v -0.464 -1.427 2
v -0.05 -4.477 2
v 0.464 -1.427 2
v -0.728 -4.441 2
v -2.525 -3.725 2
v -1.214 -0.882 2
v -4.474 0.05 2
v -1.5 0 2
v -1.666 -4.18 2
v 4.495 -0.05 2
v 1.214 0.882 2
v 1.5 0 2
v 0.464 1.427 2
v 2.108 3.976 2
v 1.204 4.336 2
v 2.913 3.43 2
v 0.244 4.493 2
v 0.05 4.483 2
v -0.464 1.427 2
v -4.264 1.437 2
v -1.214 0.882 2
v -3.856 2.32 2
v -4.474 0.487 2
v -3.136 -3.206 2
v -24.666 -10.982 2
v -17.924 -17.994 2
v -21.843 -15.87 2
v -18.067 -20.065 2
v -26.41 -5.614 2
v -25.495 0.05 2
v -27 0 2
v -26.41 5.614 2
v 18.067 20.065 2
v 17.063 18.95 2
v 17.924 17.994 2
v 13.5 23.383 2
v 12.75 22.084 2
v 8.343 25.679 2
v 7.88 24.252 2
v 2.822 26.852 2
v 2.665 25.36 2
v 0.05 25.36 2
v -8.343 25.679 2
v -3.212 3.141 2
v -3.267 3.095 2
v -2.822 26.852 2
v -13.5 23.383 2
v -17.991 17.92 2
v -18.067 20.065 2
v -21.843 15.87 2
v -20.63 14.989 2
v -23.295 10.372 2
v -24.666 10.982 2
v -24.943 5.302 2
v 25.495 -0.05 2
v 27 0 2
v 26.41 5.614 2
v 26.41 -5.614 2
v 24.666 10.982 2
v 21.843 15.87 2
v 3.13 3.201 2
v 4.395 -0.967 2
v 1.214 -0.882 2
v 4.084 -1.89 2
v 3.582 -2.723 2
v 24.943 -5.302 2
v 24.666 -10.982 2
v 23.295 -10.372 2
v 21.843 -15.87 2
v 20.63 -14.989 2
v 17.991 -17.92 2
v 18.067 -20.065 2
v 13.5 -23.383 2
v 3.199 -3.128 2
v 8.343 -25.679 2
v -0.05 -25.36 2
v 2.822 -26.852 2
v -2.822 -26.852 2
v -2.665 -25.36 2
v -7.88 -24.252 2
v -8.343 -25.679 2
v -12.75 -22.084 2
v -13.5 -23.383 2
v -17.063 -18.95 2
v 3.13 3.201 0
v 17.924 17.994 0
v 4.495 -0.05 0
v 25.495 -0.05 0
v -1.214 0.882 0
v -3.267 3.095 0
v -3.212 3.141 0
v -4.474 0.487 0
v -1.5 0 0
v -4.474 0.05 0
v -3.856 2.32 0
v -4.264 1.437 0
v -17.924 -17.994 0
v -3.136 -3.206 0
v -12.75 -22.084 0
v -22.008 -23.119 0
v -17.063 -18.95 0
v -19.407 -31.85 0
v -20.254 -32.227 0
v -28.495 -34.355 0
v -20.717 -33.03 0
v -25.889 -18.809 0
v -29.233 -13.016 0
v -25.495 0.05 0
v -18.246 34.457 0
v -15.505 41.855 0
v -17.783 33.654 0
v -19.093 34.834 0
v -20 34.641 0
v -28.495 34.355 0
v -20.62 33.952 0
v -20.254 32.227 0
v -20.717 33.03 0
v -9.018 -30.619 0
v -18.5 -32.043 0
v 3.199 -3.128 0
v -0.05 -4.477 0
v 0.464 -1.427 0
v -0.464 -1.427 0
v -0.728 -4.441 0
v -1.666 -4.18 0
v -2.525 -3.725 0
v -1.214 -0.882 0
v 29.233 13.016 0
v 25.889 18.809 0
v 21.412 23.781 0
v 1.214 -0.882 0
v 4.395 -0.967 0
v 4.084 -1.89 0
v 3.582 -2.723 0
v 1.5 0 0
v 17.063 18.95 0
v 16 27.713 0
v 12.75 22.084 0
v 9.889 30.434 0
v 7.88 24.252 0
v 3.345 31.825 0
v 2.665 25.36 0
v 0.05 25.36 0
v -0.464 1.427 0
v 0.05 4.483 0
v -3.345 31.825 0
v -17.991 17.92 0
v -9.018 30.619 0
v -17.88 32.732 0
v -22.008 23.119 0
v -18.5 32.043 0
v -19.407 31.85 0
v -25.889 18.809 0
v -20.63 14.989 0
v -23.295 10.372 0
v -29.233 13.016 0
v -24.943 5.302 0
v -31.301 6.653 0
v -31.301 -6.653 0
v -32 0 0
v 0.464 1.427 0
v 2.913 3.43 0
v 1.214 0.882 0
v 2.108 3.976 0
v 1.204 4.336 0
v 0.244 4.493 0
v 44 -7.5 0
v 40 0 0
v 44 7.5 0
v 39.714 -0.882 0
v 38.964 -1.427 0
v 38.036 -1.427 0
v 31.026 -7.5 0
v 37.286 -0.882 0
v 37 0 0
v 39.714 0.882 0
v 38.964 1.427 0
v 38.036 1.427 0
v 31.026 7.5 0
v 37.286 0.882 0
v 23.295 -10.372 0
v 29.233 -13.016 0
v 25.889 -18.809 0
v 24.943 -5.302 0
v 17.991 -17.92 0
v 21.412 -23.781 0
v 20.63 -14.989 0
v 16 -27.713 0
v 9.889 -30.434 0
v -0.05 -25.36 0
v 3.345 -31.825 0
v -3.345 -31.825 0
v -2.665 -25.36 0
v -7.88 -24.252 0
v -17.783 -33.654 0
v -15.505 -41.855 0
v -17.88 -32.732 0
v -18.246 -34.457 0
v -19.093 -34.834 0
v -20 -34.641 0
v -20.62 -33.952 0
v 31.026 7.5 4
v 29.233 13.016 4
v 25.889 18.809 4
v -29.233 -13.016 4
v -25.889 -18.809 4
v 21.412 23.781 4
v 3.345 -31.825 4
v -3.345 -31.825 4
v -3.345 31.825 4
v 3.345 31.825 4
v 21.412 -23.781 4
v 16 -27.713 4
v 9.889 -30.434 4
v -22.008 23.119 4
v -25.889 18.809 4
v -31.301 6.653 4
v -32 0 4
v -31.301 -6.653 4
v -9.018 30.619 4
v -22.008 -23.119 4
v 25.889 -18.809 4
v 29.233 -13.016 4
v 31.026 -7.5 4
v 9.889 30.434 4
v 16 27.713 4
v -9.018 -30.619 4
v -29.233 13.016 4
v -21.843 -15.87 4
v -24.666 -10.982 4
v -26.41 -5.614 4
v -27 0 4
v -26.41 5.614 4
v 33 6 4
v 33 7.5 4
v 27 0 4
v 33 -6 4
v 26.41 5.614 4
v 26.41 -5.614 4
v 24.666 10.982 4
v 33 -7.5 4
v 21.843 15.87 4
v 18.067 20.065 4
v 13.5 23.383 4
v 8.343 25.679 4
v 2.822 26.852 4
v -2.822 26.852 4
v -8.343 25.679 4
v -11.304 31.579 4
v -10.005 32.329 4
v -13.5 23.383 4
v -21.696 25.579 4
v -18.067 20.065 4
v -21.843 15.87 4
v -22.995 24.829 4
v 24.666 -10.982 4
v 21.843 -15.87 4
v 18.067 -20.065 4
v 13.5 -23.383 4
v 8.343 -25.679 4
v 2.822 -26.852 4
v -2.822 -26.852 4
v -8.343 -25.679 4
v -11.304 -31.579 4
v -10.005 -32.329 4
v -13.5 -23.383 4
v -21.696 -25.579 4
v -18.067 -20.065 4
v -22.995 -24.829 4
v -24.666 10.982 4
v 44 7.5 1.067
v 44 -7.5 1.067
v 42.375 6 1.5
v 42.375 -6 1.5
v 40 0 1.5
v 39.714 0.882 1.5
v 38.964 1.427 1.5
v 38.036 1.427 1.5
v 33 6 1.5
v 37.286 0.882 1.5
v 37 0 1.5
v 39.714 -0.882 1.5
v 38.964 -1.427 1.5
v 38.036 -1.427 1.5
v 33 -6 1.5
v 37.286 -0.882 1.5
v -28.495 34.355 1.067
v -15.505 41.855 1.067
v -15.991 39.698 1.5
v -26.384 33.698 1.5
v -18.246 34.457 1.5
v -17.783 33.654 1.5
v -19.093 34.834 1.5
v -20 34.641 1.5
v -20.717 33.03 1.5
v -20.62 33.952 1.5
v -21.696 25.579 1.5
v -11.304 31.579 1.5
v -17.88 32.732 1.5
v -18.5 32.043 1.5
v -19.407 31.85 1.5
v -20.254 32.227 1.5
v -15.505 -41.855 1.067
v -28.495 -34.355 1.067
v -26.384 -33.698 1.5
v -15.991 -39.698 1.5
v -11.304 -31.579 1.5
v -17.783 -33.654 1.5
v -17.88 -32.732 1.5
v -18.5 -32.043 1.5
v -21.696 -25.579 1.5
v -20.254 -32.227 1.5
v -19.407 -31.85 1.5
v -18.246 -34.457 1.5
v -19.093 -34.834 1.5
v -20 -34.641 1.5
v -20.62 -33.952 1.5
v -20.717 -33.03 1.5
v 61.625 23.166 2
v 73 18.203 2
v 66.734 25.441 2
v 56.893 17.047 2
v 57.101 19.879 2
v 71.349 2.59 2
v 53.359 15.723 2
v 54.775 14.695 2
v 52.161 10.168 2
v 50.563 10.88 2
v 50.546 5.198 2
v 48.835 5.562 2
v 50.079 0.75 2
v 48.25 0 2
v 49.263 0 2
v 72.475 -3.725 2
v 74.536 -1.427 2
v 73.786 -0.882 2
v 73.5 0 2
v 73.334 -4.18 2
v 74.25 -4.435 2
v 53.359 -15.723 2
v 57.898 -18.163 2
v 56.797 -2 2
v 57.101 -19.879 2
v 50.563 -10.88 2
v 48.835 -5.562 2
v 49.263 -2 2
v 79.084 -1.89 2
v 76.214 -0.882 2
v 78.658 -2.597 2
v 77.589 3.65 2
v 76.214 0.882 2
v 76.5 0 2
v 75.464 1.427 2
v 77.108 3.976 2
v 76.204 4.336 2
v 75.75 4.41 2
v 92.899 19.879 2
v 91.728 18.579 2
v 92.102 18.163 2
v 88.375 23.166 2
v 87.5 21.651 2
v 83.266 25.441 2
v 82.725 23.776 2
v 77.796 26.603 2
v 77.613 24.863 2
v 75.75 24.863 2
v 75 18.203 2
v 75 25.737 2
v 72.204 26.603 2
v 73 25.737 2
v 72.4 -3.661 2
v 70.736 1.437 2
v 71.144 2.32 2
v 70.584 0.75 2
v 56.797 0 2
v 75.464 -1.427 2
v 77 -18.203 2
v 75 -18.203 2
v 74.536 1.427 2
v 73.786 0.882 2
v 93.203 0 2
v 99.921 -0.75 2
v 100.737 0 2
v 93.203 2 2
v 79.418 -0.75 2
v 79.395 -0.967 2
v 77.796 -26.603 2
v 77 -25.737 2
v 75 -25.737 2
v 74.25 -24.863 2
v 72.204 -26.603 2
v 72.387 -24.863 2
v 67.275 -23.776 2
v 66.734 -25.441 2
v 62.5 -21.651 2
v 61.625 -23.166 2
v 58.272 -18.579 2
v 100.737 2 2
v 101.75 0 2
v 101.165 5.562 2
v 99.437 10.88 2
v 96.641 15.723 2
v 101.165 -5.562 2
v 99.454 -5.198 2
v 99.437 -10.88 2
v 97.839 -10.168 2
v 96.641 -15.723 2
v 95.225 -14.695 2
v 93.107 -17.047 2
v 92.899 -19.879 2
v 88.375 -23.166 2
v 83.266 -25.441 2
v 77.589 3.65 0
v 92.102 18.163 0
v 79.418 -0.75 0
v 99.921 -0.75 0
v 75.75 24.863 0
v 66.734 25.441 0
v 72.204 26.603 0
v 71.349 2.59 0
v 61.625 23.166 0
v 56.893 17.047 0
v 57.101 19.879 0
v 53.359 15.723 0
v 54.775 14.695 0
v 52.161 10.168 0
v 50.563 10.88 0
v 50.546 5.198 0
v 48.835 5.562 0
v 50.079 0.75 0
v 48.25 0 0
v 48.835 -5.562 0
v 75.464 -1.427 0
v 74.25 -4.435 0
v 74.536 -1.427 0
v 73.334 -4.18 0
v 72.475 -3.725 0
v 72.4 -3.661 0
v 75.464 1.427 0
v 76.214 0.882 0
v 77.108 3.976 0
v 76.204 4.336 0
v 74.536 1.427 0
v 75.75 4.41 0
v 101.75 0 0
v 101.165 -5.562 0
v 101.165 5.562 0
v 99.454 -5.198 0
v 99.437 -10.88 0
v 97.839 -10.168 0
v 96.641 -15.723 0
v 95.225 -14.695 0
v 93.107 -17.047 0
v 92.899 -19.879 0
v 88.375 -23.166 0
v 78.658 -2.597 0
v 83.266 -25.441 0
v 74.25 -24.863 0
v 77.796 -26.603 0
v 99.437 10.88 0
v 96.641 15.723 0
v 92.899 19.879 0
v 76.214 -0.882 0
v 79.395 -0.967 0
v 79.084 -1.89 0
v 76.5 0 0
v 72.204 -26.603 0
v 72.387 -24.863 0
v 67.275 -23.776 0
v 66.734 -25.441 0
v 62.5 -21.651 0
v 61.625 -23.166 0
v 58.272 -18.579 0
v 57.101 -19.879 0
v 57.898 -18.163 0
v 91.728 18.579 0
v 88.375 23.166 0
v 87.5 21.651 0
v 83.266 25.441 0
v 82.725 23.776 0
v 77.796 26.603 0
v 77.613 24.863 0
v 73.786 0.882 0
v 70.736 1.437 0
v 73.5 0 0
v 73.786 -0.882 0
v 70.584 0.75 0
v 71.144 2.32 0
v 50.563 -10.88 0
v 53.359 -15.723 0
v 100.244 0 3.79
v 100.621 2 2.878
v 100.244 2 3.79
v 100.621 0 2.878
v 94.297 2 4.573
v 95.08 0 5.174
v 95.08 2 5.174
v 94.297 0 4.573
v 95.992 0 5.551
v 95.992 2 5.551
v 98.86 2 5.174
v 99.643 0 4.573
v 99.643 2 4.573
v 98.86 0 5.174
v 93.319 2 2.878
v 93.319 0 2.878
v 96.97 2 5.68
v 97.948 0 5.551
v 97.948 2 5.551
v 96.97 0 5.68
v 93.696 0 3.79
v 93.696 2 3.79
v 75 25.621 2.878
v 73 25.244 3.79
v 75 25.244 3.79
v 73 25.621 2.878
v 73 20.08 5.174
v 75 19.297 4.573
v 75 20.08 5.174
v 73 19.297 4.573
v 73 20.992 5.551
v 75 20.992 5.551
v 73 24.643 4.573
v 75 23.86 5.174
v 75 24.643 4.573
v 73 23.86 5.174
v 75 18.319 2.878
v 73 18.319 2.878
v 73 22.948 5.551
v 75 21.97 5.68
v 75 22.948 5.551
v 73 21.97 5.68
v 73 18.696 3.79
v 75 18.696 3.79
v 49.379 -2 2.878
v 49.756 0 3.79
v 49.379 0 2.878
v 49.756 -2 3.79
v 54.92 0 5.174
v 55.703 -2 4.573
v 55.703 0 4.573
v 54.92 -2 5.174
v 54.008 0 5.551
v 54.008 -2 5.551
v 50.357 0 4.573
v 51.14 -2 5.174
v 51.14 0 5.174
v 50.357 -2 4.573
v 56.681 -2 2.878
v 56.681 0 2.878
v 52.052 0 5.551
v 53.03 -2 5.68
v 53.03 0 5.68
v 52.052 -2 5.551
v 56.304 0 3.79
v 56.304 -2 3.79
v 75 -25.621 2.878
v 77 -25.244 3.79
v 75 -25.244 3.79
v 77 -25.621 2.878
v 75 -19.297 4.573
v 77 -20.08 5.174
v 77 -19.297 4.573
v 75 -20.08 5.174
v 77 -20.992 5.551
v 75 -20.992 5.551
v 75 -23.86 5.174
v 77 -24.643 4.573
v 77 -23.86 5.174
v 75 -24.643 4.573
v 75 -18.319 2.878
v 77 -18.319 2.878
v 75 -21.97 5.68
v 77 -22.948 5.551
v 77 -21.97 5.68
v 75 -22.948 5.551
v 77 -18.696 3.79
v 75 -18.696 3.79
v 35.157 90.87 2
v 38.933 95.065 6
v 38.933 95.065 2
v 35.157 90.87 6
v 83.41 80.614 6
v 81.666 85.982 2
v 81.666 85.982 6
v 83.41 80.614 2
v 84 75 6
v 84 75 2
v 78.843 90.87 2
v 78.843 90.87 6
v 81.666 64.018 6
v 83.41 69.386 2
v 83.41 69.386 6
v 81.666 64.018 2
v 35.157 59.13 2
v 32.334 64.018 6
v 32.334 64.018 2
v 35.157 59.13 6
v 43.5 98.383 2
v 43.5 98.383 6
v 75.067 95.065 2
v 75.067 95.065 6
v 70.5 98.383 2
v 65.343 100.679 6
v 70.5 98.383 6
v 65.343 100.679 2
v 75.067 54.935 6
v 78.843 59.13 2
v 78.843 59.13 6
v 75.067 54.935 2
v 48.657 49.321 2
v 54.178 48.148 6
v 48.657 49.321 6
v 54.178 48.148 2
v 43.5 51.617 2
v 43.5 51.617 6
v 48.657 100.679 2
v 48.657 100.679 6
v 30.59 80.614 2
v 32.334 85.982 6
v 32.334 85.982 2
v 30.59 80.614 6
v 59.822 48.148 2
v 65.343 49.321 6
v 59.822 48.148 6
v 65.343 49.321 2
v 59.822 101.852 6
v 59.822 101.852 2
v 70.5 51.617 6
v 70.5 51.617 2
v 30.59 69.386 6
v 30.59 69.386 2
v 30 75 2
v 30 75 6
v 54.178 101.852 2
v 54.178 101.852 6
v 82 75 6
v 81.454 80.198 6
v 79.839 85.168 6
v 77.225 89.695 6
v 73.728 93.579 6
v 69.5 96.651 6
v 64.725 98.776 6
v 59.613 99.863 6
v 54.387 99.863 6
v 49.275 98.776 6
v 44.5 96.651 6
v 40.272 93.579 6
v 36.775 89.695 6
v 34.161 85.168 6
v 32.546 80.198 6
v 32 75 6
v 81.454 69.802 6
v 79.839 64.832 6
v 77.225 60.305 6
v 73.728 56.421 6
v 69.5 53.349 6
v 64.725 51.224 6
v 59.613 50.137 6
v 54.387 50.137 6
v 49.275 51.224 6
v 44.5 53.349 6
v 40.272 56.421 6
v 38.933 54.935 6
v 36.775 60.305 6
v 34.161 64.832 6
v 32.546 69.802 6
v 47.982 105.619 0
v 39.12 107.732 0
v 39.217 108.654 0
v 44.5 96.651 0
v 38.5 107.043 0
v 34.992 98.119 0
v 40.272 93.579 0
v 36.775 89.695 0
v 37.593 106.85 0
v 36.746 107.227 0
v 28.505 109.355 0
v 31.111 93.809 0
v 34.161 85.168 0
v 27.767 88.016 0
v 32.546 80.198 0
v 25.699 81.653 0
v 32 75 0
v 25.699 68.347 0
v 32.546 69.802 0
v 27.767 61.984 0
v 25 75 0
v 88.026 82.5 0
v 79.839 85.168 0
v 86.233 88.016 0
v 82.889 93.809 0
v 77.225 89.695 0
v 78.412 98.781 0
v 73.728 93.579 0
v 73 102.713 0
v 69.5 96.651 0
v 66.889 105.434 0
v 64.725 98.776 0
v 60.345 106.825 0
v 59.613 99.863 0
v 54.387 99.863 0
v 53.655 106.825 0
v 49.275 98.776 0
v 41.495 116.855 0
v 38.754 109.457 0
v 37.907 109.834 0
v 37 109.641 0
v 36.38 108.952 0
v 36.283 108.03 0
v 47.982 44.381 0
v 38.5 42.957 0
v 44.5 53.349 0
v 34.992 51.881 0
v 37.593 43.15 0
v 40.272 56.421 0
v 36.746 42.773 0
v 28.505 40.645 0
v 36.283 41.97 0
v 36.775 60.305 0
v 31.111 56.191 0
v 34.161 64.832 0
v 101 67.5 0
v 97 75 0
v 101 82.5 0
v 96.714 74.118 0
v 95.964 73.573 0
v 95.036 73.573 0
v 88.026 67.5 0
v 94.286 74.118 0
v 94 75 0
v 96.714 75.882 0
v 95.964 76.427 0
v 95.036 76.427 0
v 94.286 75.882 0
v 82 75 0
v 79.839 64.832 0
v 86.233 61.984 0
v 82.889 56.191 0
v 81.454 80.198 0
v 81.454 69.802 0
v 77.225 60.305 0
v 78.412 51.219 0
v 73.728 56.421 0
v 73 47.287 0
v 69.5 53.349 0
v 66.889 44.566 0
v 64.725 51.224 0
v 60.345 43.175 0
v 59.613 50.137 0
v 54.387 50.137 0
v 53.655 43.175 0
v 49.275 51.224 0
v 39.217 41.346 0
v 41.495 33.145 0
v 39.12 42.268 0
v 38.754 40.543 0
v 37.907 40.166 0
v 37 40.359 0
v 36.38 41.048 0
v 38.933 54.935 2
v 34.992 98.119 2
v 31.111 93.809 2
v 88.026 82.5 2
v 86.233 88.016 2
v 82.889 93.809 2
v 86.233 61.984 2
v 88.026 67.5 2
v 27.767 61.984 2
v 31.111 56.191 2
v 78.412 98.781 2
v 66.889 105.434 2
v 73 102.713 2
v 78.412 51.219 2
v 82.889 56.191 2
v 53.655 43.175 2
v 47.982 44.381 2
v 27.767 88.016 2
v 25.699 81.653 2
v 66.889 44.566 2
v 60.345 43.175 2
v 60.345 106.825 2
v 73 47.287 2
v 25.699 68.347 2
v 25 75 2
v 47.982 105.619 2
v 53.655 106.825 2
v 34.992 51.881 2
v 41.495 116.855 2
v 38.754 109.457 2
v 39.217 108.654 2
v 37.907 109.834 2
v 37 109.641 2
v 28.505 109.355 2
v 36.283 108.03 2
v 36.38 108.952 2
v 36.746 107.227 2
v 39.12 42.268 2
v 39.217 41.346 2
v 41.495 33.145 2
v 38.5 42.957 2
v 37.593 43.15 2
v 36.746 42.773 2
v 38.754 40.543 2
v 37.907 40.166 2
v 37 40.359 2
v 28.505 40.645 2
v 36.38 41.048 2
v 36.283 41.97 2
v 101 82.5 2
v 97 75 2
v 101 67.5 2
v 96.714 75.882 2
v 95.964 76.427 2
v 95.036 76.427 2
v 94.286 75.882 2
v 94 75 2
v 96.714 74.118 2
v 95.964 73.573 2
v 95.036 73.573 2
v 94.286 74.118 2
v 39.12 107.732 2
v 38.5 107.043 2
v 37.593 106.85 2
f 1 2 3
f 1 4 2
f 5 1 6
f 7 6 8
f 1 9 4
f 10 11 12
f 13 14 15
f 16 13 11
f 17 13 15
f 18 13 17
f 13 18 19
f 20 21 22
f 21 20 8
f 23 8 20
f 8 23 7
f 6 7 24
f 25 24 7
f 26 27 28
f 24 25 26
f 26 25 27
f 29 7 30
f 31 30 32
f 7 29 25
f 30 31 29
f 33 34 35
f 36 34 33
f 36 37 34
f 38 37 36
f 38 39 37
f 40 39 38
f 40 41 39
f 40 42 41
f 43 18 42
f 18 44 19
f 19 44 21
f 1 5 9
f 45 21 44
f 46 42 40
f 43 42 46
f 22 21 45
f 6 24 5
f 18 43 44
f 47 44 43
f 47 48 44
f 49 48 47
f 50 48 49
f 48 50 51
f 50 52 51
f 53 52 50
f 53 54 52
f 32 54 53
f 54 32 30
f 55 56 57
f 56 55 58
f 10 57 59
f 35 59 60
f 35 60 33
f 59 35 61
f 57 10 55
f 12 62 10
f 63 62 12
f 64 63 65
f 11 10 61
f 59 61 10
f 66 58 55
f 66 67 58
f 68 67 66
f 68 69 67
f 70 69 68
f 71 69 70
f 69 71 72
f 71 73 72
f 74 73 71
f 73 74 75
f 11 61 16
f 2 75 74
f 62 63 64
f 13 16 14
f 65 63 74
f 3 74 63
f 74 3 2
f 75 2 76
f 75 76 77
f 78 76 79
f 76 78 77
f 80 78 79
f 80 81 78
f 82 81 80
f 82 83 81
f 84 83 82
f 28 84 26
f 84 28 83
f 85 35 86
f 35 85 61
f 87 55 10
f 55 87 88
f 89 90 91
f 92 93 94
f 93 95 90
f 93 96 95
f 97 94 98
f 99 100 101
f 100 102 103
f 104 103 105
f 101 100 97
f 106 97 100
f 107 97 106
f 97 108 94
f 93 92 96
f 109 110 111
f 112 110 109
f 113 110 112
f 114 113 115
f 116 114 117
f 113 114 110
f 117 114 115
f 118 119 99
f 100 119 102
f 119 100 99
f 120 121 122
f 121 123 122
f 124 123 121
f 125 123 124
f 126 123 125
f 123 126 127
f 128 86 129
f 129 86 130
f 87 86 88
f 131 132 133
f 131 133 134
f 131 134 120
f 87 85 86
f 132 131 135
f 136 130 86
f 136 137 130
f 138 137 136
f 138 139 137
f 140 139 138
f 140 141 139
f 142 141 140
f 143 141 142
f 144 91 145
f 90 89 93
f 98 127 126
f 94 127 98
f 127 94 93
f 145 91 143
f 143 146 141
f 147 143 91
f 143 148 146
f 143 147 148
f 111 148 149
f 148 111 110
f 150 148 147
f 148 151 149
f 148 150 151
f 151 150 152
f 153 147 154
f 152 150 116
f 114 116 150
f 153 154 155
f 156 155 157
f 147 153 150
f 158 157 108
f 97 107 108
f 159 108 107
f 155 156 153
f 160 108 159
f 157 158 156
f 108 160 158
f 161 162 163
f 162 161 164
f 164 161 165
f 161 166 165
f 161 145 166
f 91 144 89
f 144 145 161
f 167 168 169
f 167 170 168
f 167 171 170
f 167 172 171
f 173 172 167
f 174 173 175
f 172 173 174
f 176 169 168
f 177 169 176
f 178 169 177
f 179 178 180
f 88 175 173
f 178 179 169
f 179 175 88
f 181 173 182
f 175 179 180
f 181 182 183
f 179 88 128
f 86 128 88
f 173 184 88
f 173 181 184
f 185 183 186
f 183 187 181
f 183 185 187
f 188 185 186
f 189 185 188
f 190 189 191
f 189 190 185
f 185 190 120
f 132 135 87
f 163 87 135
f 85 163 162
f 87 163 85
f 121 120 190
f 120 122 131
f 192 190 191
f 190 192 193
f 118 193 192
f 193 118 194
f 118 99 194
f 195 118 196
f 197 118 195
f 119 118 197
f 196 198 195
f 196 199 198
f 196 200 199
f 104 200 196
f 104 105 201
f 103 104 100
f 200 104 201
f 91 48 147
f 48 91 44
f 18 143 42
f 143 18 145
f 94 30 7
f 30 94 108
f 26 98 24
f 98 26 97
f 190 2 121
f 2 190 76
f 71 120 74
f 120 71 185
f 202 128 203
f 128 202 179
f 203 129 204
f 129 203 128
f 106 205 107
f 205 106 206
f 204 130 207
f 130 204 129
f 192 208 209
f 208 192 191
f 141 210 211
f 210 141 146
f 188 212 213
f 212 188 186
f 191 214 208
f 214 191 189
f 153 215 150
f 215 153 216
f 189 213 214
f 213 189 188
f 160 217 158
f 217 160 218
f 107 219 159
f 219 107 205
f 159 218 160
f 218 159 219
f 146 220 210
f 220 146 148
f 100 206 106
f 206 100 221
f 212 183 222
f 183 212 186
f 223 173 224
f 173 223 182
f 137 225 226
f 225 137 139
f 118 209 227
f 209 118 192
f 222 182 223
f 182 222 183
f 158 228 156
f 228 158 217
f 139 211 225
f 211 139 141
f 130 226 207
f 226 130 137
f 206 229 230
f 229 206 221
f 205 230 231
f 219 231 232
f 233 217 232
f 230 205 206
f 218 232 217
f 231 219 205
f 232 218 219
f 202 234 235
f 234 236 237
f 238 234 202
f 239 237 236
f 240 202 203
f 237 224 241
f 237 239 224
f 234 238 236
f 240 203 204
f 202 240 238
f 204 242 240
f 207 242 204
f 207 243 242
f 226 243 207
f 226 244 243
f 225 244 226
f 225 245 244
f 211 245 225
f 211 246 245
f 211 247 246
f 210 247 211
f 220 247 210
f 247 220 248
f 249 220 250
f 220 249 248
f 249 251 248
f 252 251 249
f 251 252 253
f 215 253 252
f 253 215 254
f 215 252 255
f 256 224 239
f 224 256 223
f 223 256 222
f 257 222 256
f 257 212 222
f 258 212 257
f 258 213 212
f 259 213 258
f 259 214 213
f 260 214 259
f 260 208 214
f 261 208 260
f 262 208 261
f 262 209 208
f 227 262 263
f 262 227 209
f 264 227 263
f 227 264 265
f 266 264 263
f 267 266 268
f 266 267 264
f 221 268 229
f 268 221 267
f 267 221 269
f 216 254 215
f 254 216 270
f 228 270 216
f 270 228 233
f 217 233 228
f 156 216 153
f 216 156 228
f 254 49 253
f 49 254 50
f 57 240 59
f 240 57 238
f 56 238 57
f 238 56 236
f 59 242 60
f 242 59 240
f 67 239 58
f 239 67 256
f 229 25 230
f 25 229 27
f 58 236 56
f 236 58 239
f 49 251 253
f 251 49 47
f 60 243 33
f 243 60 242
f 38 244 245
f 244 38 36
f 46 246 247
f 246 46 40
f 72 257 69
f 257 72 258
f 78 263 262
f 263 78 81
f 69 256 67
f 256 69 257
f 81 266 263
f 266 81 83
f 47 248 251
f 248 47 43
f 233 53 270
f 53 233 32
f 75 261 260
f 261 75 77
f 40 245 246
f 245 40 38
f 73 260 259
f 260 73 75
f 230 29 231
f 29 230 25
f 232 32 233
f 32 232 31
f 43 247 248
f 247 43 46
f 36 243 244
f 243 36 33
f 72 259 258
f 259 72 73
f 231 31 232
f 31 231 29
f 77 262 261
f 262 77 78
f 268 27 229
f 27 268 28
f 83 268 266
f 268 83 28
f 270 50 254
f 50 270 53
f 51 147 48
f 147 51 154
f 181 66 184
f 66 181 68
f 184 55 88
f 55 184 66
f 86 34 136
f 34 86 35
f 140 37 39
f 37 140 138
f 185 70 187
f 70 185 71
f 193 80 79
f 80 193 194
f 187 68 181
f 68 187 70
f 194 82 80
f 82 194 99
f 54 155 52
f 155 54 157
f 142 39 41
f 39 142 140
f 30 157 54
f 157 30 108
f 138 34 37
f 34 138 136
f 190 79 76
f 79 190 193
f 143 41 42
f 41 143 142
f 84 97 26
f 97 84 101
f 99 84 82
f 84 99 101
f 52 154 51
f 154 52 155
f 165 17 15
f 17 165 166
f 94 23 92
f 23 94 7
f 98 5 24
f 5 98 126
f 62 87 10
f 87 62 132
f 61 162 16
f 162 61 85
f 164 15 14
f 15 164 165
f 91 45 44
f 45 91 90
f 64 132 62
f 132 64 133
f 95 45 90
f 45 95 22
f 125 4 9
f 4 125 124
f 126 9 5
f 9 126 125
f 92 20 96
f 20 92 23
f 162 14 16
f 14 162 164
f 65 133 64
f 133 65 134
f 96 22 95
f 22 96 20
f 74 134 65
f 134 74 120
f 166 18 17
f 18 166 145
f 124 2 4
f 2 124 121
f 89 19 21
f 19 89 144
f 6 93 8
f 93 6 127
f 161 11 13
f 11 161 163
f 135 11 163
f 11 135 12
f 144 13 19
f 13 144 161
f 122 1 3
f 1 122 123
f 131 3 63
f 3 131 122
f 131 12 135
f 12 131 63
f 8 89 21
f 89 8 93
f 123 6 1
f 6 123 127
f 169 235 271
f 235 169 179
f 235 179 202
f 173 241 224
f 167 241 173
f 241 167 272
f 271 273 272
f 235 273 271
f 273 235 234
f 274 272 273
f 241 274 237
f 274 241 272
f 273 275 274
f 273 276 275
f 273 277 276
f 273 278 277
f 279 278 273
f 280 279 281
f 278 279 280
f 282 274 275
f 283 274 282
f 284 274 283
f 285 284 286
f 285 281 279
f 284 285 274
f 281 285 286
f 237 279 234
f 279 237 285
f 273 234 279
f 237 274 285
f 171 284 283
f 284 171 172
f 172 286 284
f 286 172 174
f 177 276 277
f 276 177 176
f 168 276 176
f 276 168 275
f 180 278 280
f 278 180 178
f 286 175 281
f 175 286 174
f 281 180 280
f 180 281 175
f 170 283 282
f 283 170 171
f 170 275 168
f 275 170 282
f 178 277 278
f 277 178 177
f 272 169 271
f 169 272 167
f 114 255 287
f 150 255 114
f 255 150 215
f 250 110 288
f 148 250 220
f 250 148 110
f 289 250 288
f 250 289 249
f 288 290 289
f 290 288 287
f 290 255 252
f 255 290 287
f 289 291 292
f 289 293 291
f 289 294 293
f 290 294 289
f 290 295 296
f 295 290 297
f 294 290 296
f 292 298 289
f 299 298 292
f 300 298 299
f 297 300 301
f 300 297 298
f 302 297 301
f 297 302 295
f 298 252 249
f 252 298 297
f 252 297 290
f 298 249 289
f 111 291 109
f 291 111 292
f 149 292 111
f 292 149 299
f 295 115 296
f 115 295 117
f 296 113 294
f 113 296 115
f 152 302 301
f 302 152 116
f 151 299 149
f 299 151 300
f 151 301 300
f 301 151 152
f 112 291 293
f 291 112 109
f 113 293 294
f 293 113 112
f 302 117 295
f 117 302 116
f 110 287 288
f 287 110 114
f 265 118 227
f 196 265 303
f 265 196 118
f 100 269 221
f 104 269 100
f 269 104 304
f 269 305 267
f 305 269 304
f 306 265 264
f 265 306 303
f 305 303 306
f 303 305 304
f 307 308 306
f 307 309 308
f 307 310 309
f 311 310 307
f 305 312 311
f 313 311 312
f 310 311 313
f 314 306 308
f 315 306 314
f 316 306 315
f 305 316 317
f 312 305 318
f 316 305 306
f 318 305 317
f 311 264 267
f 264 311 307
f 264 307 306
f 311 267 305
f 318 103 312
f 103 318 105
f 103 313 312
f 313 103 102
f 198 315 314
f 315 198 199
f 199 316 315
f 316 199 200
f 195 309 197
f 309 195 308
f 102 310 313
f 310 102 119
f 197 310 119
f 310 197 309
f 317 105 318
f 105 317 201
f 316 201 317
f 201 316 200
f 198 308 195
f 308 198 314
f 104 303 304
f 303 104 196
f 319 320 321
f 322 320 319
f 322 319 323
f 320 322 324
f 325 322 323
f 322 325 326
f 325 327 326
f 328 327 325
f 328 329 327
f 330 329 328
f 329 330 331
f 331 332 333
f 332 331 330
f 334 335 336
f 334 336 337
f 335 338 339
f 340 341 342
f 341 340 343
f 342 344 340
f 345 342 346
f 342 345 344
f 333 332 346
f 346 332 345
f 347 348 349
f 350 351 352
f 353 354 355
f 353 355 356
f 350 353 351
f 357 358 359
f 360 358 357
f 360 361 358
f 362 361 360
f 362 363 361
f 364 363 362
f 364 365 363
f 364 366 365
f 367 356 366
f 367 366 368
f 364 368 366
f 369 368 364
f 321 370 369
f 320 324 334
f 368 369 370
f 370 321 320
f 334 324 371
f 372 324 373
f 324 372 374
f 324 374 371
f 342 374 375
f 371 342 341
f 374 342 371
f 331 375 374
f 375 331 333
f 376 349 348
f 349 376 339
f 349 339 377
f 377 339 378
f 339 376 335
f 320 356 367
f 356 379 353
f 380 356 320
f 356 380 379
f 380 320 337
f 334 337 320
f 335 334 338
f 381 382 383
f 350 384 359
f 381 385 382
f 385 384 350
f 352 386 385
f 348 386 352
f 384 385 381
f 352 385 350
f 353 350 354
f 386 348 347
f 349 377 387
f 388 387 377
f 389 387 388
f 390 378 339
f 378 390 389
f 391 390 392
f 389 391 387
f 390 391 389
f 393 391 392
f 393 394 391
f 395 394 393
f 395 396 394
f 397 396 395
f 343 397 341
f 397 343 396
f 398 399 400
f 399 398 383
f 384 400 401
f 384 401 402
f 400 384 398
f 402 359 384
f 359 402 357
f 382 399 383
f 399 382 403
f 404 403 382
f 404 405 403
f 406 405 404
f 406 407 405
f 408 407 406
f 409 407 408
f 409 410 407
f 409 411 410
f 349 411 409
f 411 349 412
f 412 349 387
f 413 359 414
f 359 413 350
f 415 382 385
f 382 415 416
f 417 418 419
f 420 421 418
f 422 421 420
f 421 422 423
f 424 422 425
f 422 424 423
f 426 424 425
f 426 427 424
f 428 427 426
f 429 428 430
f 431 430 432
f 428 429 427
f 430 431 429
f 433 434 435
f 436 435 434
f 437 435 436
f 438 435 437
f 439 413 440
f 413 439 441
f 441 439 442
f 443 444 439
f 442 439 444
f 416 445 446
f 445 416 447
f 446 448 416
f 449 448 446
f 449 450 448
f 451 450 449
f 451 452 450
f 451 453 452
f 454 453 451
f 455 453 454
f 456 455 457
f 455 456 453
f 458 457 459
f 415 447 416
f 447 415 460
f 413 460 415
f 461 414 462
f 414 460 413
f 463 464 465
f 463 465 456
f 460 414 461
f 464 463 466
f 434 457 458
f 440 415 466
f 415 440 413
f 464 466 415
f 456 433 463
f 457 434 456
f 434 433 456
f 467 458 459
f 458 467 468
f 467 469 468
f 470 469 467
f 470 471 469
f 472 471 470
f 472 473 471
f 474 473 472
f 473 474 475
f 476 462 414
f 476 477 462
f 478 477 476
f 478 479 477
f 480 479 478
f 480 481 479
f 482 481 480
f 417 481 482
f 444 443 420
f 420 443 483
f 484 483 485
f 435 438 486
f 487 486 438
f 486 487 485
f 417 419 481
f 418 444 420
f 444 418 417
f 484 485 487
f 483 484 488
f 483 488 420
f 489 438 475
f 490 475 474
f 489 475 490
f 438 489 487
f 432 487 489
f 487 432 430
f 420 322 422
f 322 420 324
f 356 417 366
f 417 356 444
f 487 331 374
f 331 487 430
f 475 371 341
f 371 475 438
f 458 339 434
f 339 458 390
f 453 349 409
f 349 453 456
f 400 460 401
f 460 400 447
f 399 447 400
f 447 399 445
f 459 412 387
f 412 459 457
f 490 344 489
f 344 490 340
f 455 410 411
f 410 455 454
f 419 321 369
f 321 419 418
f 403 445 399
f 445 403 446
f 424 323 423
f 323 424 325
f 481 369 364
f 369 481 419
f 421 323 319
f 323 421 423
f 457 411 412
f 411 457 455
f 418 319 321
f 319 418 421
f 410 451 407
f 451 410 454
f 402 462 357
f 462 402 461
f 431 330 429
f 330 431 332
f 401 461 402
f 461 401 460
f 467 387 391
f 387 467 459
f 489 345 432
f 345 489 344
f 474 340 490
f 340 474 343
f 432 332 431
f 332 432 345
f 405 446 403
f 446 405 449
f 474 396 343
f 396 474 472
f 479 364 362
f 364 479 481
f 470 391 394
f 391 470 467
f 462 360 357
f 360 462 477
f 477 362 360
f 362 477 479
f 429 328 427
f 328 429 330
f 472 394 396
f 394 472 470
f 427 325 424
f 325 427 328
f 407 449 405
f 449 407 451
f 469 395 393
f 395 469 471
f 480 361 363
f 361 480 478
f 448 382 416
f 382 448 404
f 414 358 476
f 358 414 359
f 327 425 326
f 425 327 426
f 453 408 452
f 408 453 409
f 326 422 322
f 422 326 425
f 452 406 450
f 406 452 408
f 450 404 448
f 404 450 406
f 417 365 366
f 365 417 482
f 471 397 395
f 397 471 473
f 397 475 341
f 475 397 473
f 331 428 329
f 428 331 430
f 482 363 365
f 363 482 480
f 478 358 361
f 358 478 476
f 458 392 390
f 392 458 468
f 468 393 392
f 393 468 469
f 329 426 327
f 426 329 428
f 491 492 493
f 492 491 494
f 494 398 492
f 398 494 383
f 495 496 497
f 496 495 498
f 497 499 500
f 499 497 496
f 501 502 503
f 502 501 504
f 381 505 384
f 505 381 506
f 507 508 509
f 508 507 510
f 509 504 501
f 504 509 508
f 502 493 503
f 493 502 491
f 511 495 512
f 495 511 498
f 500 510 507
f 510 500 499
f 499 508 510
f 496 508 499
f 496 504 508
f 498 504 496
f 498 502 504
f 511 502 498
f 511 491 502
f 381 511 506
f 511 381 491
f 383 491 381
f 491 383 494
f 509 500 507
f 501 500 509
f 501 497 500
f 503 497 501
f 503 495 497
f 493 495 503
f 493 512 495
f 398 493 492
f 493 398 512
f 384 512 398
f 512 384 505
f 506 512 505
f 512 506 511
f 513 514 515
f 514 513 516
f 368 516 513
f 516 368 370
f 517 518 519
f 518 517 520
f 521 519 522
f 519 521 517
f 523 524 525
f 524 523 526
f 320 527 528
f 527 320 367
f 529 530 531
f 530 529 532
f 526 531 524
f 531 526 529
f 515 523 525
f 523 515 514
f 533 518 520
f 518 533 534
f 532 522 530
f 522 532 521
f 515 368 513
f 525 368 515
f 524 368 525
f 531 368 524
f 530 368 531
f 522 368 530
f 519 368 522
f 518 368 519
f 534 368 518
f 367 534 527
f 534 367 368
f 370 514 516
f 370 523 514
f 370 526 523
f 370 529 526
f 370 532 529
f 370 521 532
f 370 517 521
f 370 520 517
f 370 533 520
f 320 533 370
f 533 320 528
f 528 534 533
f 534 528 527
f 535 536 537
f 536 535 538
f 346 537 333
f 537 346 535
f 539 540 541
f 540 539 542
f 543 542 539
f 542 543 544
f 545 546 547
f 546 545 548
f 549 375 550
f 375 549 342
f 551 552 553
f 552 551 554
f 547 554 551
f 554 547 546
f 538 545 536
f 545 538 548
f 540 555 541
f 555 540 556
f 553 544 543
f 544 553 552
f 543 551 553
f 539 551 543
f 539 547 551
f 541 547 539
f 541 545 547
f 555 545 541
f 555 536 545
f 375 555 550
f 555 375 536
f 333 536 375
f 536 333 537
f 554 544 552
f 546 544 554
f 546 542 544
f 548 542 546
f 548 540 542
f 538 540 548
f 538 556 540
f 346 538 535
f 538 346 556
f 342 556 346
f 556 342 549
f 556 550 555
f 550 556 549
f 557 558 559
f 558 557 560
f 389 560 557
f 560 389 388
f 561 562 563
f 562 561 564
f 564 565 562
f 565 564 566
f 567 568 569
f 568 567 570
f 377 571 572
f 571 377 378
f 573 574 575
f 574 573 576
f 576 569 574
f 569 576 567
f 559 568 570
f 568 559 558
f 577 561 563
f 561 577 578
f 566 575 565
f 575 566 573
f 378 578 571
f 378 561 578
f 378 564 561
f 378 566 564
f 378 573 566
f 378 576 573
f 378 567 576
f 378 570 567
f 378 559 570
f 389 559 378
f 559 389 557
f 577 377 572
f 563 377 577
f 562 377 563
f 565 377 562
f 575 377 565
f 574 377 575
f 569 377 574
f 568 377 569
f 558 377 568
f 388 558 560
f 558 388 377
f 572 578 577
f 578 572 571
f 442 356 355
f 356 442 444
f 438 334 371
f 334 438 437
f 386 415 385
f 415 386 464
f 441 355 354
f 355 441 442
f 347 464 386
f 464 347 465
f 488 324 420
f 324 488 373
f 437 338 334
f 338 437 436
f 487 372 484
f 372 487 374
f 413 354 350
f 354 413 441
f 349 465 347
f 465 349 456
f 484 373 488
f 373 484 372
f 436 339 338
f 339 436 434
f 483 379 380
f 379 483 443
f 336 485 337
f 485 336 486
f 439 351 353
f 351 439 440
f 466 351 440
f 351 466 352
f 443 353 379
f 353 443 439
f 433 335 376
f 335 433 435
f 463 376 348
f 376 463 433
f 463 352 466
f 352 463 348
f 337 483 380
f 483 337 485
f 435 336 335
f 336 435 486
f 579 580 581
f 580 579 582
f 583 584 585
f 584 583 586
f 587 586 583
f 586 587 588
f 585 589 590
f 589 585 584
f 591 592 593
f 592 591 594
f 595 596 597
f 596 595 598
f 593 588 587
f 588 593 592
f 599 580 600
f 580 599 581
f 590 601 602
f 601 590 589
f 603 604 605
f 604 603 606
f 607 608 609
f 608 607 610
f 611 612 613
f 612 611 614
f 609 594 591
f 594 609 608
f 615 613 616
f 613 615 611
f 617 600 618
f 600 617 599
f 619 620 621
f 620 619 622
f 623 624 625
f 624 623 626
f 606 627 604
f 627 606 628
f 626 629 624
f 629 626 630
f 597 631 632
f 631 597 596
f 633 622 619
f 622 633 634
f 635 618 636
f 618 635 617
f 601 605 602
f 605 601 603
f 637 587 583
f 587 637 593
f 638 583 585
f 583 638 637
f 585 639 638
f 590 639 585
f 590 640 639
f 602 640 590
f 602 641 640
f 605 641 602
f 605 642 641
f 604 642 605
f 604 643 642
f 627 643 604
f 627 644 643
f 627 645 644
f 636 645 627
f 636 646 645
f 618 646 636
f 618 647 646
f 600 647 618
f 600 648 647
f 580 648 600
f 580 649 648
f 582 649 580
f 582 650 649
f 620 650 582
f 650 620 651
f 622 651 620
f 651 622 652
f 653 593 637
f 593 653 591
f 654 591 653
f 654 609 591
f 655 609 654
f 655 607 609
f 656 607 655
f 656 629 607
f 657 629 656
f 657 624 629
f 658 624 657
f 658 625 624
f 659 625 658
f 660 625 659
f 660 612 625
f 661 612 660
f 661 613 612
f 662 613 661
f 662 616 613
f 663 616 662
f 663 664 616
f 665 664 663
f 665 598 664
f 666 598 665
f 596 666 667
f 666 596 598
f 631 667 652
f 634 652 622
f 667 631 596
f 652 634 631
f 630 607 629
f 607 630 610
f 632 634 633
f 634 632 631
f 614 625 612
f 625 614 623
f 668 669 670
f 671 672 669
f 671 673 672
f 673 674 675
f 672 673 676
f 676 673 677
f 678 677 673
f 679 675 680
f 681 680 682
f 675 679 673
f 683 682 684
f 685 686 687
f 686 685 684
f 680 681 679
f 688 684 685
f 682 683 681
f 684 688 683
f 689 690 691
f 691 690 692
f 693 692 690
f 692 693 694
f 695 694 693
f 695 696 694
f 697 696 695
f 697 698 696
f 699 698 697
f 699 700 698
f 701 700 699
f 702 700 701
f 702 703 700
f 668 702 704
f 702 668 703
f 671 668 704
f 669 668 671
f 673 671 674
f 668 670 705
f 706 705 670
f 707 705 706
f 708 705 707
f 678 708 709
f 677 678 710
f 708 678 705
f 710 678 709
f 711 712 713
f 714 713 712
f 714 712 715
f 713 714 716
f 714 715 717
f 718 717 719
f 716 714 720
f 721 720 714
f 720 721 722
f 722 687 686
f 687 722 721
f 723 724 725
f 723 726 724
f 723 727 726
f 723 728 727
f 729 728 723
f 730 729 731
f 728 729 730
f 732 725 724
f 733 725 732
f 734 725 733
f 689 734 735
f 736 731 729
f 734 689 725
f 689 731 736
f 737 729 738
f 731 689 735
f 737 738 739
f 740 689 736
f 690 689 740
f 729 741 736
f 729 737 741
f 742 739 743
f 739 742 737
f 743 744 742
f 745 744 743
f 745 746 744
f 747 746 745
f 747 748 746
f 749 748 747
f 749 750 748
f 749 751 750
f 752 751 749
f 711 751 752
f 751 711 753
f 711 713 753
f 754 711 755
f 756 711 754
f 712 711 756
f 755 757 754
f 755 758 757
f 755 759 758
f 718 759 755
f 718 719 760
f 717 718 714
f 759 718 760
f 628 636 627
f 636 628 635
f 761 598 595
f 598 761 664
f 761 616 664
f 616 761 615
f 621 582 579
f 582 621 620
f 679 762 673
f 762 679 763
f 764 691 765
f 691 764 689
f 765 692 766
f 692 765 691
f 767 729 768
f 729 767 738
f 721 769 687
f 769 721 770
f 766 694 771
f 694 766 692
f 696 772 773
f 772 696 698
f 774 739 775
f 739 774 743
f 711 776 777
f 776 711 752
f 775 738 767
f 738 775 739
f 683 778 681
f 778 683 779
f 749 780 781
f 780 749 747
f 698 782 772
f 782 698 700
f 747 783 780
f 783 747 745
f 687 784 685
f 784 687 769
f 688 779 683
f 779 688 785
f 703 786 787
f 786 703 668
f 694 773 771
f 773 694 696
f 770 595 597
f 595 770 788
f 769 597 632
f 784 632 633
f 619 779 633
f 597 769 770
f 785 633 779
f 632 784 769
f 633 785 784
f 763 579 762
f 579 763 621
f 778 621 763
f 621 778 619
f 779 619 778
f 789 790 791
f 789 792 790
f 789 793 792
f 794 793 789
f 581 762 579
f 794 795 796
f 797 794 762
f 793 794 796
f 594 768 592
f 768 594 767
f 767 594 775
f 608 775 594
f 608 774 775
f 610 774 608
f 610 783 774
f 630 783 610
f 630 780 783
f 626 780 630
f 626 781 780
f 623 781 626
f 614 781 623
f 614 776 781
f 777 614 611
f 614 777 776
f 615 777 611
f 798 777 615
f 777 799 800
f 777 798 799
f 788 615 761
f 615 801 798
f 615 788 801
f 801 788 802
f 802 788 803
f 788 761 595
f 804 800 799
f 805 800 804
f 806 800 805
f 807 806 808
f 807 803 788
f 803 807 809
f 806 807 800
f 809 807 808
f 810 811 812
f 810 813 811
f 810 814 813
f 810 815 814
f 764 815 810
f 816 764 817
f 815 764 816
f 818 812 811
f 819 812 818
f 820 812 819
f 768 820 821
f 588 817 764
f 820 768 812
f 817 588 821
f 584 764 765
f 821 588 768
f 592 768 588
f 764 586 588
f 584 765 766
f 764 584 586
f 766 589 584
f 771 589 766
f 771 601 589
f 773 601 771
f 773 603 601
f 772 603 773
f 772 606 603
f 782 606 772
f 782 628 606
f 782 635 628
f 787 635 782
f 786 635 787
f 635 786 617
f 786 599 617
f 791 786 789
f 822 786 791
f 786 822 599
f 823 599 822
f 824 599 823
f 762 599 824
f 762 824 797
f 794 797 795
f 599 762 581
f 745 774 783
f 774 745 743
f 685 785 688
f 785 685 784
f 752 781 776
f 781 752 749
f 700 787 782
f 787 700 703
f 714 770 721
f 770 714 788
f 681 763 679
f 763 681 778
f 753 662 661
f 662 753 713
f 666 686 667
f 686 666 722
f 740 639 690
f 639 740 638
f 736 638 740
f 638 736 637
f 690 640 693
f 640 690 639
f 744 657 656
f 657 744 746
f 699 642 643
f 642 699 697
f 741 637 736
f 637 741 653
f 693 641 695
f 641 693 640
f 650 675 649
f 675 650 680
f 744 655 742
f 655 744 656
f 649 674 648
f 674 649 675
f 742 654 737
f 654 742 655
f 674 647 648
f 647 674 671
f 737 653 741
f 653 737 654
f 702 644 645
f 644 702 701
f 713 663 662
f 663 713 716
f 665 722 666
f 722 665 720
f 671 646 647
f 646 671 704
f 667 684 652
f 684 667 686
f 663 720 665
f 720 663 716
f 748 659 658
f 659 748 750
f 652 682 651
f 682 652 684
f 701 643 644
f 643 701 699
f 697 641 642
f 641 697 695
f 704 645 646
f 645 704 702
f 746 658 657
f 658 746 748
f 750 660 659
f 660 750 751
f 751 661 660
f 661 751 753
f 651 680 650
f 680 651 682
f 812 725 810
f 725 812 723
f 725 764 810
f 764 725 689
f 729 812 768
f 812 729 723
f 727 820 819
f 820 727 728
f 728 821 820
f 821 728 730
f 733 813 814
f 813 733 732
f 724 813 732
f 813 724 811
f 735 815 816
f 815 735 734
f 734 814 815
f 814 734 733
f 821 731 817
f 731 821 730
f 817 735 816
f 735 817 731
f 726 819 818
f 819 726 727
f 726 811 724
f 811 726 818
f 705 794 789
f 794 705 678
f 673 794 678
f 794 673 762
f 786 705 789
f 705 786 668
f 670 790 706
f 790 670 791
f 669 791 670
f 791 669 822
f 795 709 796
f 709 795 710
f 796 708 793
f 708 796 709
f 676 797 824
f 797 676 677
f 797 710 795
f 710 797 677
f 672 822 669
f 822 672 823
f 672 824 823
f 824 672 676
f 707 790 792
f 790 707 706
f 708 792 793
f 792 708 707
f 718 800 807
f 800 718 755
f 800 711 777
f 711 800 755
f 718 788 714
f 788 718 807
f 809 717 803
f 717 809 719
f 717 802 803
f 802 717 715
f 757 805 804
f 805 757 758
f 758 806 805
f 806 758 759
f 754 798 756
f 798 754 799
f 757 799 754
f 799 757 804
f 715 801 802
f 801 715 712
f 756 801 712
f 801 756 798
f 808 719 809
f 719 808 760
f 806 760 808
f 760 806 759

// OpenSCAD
// Ilmion
// 2013-05

// preview[view:south, tilt:top]

/* [Parameters] */
// Which one would you like to see?
part = "all"; // [first:Vent hole,second:vent door,third:inside part, both:Vent hole and door, all:all]
// Diameter (in mm) of the hole to be ventillated (default : 54 mm = 2 1/8 inches)
Hole_Diameter = 54; // [2.0:170.0]
// Thickness (in mm) total of the vent door and holed part (default : 4 mm)
Thickness = 4; // [1.0:20.0]
// Number of hole in the vent (default : 4)
Number_of_Ventilation_hole = 4; // [2:6]
// How much wider (in mm) are the door compare to the hole they hide (default : 1.5 mm)
Plus_Width_of_door = 1.5; // [1.00:5.00]
// Tolerance (in mm) for better fitting of the door in the vent (default : 0.25)
Tolerance = 0.25; // [0.00:1.00]
// Thickness (in mm) of the wall to be ventillated. Set the height of the inside part.
Enclosure_Thickness = 4; // [1:20]
// Diameter (in mm) of the hole used for connecting the door with the holed part (default : 3 for 3mm filament)
Joint_Diameter = 3; // [0: 10]

/* [Screws] */

// Number of screw fixation (default : 3)
Number_of_fixation = 3; // [2:6]
// Diameter (in mm) of the screw to be use to fix the vent (default : 3mm)
Screw_diameter = 3;

/* [Hidden] */

gAngle = 360/(Number_of_Ventilation_hole*2);
gCenterDiam = max(0.20 * (Hole_Diameter/2), 9);
gScrewSectionLength = Screw_diameter*5;
gScrewSectionWidth = Screw_diameter*5;
$fs=1;

print_part();

module print_part() {
	if (part == "first") {
		VentHole();
	} else if (part == "second") {
		VentDoor();
	} else if (part == "both") {
		VentHole();
		translate([Hole_Diameter+16,0,0]) VentDoor();
	} else if (part == "third") {
		InsideConnector();
	} else if (part == "all") {
		VentHole();
		translate([Hole_Diameter+gScrewSectionLength+6,0,0]) VentDoor();
		translate([Hole_Diameter/3*2+gScrewSectionLength+6, Hole_Diameter+gScrewSectionLength+6,0]) InsideConnector();
	} else {
		VentHole();
		translate([Hole_Diameter+gScrewSectionLength+6,0,0]) VentDoor();
		translate([Hole_Diameter/3*2+gScrewSectionLength+6, Hole_Diameter+gScrewSectionLength+6,0]) InsideConnector();
	}
}

module ScrewSection()
{
	difference()
	{
		union()
		{
			cube([4,gScrewSectionWidth,Thickness]);
			translate([4,gScrewSectionWidth,0]) rotate([90,0,0]) linear_extrude(height = gScrewSectionWidth) polygon([[0,0], [0, Thickness], [gScrewSectionLength,0]]);
		}
		translate([4, 1.5, 1.5]) cube([gScrewSectionLength+10, gScrewSectionWidth-3, Thickness+5]);
		translate([gScrewSectionLength*0.5+2,gScrewSectionWidth/2,-1]) cylinder(h=10, r=Screw_diameter/2);
		translate([gScrewSectionLength,-1,-1]) cube([20,gScrewSectionWidth+2,20]);
	}
}

module FlatScrewSection()
{
	difference()
	{
		cube([gScrewSectionLength,gScrewSectionWidth,2]);
		translate([gScrewSectionLength*0.5+2, gScrewSectionWidth/2,-1]) cylinder(h=10, r=Screw_diameter/2);
	}
}

module Helice(pAngle, pDiam, pHeight, pWidth = 0.1)
{
	union()
	{
		for (i = [0:Number_of_Ventilation_hole-1])
		{
			hull()
			{
				rotate([0,0, (i * pAngle) + (i * (360 - (Number_of_Ventilation_hole*pAngle)) / Number_of_Ventilation_hole)]) 
				{
					translate([0, pWidth/-2,0]) cube([pDiam, pWidth, pHeight]);
					rotate([0,0, pAngle]) translate([0, pWidth/-2,0])cube([pDiam, pWidth, pHeight]);
				}
			}
		}
	}
}

module VentHole()
{
	union()
	{
	difference()
	{
		union()
		{
			difference()
			{
				Helice(gAngle, Hole_Diameter, Thickness/2);
				translate([0, 0, -1])
				{
					difference()
					{
						cylinder(h=Thickness+2, r=Hole_Diameter + 5);
						translate([0, 0, -1])
						{
							cylinder(h=Thickness+4, r=(Hole_Diameter / 2) + 5);
						}
					}
				}
			}
			cylinder(h=Thickness/2, r=gCenterDiam / 2);
			difference()
			{
				cylinder(h=Thickness, r=Hole_Diameter / 2 + 5);
				translate([0,0,-1]) cylinder(h=Thickness+2, r=Hole_Diameter / 2);
			}
			difference()
			{
				cylinder(h=Thickness/2, r=Hole_Diameter/2+1);
				translate([0,0,-1]) cylinder(h=Thickness/2+2, r=Hole_Diameter/2-1.5);
			}
		}
		if(Joint_Diameter > 0)
		{
			translate([0,0,-3]) cylinder(h=Thickness + 10, r=Joint_Diameter/2);
		}
	}
	for (j = [0:Number_of_fixation-1])
	{
		rotate([0,0,j*(360/Number_of_fixation)]) translate([Hole_Diameter/2+2, gScrewSectionWidth/-2,0]) ScrewSection();
	}
	}
}

module Pognee()
{
	rotate([90,0,0])
	difference()
	{
		cylinder(h=2, r=0.07*Hole_Diameter);
		translate([Hole_Diameter/2*-1,Hole_Diameter*-1,-1]) cube(Hole_Diameter,Hole_Diameter,4);
	}
}

module VentDoor()
{
	difference()
	{
		union()
		{
			difference()
			{
				Helice(gAngle, Hole_Diameter, Thickness/2, Plus_Width_of_door);
				
				translate([0,0,-1]) 
				{
					difference()
					{
						cylinder(h=Thickness/2+2, r=Hole_Diameter*2);
						translate([0,0,-1]) cylinder(h=Thickness/2+4, r=Hole_Diameter/2-Tolerance);
					}
				}
			}
			cylinder(h=Thickness/2, r=gCenterDiam/2);
			difference()
			{
			cylinder(h=Thickness/2, r=Hole_Diameter/2-Tolerance);
			translate([0,0,-1]) cylinder(Thickness/2+2, r=Hole_Diameter/2-2);
			}
			for (j = [0:Number_of_Ventilation_hole-1])
			{
				rotate([0,0,j*(360/Number_of_Ventilation_hole)]) translate([Hole_Diameter/2-0.07*Hole_Diameter-Tolerance-1,2,Thickness/2-0.1])
				{
					Pognee();
				}
			}
		}
		if(Joint_Diameter > 0)
		{
			translate([0,0,-3]) cylinder(h=Thickness + 10, r=Joint_Diameter/2);
		}
	}
}

module InsideConnector()
{
	difference()
	{
		union()
		{
			cylinder(h=Enclosure_Thickness+2, r=Hole_Diameter/2);
			cylinder(h=2, r=Hole_Diameter / 2 + 5);
		}
		translate([0,0,-1]) cylinder(h=Enclosure_Thickness+4, r=Hole_Diameter/2-2);
	}
	for (j = [0:Number_of_fixation-1])
	{
		rotate([0,0,j*(360/Number_of_fixation)]) translate([Hole_Diameter/2+2, gScrewSectionWidth/-2,0]) FlatScrewSection();
	}
}
